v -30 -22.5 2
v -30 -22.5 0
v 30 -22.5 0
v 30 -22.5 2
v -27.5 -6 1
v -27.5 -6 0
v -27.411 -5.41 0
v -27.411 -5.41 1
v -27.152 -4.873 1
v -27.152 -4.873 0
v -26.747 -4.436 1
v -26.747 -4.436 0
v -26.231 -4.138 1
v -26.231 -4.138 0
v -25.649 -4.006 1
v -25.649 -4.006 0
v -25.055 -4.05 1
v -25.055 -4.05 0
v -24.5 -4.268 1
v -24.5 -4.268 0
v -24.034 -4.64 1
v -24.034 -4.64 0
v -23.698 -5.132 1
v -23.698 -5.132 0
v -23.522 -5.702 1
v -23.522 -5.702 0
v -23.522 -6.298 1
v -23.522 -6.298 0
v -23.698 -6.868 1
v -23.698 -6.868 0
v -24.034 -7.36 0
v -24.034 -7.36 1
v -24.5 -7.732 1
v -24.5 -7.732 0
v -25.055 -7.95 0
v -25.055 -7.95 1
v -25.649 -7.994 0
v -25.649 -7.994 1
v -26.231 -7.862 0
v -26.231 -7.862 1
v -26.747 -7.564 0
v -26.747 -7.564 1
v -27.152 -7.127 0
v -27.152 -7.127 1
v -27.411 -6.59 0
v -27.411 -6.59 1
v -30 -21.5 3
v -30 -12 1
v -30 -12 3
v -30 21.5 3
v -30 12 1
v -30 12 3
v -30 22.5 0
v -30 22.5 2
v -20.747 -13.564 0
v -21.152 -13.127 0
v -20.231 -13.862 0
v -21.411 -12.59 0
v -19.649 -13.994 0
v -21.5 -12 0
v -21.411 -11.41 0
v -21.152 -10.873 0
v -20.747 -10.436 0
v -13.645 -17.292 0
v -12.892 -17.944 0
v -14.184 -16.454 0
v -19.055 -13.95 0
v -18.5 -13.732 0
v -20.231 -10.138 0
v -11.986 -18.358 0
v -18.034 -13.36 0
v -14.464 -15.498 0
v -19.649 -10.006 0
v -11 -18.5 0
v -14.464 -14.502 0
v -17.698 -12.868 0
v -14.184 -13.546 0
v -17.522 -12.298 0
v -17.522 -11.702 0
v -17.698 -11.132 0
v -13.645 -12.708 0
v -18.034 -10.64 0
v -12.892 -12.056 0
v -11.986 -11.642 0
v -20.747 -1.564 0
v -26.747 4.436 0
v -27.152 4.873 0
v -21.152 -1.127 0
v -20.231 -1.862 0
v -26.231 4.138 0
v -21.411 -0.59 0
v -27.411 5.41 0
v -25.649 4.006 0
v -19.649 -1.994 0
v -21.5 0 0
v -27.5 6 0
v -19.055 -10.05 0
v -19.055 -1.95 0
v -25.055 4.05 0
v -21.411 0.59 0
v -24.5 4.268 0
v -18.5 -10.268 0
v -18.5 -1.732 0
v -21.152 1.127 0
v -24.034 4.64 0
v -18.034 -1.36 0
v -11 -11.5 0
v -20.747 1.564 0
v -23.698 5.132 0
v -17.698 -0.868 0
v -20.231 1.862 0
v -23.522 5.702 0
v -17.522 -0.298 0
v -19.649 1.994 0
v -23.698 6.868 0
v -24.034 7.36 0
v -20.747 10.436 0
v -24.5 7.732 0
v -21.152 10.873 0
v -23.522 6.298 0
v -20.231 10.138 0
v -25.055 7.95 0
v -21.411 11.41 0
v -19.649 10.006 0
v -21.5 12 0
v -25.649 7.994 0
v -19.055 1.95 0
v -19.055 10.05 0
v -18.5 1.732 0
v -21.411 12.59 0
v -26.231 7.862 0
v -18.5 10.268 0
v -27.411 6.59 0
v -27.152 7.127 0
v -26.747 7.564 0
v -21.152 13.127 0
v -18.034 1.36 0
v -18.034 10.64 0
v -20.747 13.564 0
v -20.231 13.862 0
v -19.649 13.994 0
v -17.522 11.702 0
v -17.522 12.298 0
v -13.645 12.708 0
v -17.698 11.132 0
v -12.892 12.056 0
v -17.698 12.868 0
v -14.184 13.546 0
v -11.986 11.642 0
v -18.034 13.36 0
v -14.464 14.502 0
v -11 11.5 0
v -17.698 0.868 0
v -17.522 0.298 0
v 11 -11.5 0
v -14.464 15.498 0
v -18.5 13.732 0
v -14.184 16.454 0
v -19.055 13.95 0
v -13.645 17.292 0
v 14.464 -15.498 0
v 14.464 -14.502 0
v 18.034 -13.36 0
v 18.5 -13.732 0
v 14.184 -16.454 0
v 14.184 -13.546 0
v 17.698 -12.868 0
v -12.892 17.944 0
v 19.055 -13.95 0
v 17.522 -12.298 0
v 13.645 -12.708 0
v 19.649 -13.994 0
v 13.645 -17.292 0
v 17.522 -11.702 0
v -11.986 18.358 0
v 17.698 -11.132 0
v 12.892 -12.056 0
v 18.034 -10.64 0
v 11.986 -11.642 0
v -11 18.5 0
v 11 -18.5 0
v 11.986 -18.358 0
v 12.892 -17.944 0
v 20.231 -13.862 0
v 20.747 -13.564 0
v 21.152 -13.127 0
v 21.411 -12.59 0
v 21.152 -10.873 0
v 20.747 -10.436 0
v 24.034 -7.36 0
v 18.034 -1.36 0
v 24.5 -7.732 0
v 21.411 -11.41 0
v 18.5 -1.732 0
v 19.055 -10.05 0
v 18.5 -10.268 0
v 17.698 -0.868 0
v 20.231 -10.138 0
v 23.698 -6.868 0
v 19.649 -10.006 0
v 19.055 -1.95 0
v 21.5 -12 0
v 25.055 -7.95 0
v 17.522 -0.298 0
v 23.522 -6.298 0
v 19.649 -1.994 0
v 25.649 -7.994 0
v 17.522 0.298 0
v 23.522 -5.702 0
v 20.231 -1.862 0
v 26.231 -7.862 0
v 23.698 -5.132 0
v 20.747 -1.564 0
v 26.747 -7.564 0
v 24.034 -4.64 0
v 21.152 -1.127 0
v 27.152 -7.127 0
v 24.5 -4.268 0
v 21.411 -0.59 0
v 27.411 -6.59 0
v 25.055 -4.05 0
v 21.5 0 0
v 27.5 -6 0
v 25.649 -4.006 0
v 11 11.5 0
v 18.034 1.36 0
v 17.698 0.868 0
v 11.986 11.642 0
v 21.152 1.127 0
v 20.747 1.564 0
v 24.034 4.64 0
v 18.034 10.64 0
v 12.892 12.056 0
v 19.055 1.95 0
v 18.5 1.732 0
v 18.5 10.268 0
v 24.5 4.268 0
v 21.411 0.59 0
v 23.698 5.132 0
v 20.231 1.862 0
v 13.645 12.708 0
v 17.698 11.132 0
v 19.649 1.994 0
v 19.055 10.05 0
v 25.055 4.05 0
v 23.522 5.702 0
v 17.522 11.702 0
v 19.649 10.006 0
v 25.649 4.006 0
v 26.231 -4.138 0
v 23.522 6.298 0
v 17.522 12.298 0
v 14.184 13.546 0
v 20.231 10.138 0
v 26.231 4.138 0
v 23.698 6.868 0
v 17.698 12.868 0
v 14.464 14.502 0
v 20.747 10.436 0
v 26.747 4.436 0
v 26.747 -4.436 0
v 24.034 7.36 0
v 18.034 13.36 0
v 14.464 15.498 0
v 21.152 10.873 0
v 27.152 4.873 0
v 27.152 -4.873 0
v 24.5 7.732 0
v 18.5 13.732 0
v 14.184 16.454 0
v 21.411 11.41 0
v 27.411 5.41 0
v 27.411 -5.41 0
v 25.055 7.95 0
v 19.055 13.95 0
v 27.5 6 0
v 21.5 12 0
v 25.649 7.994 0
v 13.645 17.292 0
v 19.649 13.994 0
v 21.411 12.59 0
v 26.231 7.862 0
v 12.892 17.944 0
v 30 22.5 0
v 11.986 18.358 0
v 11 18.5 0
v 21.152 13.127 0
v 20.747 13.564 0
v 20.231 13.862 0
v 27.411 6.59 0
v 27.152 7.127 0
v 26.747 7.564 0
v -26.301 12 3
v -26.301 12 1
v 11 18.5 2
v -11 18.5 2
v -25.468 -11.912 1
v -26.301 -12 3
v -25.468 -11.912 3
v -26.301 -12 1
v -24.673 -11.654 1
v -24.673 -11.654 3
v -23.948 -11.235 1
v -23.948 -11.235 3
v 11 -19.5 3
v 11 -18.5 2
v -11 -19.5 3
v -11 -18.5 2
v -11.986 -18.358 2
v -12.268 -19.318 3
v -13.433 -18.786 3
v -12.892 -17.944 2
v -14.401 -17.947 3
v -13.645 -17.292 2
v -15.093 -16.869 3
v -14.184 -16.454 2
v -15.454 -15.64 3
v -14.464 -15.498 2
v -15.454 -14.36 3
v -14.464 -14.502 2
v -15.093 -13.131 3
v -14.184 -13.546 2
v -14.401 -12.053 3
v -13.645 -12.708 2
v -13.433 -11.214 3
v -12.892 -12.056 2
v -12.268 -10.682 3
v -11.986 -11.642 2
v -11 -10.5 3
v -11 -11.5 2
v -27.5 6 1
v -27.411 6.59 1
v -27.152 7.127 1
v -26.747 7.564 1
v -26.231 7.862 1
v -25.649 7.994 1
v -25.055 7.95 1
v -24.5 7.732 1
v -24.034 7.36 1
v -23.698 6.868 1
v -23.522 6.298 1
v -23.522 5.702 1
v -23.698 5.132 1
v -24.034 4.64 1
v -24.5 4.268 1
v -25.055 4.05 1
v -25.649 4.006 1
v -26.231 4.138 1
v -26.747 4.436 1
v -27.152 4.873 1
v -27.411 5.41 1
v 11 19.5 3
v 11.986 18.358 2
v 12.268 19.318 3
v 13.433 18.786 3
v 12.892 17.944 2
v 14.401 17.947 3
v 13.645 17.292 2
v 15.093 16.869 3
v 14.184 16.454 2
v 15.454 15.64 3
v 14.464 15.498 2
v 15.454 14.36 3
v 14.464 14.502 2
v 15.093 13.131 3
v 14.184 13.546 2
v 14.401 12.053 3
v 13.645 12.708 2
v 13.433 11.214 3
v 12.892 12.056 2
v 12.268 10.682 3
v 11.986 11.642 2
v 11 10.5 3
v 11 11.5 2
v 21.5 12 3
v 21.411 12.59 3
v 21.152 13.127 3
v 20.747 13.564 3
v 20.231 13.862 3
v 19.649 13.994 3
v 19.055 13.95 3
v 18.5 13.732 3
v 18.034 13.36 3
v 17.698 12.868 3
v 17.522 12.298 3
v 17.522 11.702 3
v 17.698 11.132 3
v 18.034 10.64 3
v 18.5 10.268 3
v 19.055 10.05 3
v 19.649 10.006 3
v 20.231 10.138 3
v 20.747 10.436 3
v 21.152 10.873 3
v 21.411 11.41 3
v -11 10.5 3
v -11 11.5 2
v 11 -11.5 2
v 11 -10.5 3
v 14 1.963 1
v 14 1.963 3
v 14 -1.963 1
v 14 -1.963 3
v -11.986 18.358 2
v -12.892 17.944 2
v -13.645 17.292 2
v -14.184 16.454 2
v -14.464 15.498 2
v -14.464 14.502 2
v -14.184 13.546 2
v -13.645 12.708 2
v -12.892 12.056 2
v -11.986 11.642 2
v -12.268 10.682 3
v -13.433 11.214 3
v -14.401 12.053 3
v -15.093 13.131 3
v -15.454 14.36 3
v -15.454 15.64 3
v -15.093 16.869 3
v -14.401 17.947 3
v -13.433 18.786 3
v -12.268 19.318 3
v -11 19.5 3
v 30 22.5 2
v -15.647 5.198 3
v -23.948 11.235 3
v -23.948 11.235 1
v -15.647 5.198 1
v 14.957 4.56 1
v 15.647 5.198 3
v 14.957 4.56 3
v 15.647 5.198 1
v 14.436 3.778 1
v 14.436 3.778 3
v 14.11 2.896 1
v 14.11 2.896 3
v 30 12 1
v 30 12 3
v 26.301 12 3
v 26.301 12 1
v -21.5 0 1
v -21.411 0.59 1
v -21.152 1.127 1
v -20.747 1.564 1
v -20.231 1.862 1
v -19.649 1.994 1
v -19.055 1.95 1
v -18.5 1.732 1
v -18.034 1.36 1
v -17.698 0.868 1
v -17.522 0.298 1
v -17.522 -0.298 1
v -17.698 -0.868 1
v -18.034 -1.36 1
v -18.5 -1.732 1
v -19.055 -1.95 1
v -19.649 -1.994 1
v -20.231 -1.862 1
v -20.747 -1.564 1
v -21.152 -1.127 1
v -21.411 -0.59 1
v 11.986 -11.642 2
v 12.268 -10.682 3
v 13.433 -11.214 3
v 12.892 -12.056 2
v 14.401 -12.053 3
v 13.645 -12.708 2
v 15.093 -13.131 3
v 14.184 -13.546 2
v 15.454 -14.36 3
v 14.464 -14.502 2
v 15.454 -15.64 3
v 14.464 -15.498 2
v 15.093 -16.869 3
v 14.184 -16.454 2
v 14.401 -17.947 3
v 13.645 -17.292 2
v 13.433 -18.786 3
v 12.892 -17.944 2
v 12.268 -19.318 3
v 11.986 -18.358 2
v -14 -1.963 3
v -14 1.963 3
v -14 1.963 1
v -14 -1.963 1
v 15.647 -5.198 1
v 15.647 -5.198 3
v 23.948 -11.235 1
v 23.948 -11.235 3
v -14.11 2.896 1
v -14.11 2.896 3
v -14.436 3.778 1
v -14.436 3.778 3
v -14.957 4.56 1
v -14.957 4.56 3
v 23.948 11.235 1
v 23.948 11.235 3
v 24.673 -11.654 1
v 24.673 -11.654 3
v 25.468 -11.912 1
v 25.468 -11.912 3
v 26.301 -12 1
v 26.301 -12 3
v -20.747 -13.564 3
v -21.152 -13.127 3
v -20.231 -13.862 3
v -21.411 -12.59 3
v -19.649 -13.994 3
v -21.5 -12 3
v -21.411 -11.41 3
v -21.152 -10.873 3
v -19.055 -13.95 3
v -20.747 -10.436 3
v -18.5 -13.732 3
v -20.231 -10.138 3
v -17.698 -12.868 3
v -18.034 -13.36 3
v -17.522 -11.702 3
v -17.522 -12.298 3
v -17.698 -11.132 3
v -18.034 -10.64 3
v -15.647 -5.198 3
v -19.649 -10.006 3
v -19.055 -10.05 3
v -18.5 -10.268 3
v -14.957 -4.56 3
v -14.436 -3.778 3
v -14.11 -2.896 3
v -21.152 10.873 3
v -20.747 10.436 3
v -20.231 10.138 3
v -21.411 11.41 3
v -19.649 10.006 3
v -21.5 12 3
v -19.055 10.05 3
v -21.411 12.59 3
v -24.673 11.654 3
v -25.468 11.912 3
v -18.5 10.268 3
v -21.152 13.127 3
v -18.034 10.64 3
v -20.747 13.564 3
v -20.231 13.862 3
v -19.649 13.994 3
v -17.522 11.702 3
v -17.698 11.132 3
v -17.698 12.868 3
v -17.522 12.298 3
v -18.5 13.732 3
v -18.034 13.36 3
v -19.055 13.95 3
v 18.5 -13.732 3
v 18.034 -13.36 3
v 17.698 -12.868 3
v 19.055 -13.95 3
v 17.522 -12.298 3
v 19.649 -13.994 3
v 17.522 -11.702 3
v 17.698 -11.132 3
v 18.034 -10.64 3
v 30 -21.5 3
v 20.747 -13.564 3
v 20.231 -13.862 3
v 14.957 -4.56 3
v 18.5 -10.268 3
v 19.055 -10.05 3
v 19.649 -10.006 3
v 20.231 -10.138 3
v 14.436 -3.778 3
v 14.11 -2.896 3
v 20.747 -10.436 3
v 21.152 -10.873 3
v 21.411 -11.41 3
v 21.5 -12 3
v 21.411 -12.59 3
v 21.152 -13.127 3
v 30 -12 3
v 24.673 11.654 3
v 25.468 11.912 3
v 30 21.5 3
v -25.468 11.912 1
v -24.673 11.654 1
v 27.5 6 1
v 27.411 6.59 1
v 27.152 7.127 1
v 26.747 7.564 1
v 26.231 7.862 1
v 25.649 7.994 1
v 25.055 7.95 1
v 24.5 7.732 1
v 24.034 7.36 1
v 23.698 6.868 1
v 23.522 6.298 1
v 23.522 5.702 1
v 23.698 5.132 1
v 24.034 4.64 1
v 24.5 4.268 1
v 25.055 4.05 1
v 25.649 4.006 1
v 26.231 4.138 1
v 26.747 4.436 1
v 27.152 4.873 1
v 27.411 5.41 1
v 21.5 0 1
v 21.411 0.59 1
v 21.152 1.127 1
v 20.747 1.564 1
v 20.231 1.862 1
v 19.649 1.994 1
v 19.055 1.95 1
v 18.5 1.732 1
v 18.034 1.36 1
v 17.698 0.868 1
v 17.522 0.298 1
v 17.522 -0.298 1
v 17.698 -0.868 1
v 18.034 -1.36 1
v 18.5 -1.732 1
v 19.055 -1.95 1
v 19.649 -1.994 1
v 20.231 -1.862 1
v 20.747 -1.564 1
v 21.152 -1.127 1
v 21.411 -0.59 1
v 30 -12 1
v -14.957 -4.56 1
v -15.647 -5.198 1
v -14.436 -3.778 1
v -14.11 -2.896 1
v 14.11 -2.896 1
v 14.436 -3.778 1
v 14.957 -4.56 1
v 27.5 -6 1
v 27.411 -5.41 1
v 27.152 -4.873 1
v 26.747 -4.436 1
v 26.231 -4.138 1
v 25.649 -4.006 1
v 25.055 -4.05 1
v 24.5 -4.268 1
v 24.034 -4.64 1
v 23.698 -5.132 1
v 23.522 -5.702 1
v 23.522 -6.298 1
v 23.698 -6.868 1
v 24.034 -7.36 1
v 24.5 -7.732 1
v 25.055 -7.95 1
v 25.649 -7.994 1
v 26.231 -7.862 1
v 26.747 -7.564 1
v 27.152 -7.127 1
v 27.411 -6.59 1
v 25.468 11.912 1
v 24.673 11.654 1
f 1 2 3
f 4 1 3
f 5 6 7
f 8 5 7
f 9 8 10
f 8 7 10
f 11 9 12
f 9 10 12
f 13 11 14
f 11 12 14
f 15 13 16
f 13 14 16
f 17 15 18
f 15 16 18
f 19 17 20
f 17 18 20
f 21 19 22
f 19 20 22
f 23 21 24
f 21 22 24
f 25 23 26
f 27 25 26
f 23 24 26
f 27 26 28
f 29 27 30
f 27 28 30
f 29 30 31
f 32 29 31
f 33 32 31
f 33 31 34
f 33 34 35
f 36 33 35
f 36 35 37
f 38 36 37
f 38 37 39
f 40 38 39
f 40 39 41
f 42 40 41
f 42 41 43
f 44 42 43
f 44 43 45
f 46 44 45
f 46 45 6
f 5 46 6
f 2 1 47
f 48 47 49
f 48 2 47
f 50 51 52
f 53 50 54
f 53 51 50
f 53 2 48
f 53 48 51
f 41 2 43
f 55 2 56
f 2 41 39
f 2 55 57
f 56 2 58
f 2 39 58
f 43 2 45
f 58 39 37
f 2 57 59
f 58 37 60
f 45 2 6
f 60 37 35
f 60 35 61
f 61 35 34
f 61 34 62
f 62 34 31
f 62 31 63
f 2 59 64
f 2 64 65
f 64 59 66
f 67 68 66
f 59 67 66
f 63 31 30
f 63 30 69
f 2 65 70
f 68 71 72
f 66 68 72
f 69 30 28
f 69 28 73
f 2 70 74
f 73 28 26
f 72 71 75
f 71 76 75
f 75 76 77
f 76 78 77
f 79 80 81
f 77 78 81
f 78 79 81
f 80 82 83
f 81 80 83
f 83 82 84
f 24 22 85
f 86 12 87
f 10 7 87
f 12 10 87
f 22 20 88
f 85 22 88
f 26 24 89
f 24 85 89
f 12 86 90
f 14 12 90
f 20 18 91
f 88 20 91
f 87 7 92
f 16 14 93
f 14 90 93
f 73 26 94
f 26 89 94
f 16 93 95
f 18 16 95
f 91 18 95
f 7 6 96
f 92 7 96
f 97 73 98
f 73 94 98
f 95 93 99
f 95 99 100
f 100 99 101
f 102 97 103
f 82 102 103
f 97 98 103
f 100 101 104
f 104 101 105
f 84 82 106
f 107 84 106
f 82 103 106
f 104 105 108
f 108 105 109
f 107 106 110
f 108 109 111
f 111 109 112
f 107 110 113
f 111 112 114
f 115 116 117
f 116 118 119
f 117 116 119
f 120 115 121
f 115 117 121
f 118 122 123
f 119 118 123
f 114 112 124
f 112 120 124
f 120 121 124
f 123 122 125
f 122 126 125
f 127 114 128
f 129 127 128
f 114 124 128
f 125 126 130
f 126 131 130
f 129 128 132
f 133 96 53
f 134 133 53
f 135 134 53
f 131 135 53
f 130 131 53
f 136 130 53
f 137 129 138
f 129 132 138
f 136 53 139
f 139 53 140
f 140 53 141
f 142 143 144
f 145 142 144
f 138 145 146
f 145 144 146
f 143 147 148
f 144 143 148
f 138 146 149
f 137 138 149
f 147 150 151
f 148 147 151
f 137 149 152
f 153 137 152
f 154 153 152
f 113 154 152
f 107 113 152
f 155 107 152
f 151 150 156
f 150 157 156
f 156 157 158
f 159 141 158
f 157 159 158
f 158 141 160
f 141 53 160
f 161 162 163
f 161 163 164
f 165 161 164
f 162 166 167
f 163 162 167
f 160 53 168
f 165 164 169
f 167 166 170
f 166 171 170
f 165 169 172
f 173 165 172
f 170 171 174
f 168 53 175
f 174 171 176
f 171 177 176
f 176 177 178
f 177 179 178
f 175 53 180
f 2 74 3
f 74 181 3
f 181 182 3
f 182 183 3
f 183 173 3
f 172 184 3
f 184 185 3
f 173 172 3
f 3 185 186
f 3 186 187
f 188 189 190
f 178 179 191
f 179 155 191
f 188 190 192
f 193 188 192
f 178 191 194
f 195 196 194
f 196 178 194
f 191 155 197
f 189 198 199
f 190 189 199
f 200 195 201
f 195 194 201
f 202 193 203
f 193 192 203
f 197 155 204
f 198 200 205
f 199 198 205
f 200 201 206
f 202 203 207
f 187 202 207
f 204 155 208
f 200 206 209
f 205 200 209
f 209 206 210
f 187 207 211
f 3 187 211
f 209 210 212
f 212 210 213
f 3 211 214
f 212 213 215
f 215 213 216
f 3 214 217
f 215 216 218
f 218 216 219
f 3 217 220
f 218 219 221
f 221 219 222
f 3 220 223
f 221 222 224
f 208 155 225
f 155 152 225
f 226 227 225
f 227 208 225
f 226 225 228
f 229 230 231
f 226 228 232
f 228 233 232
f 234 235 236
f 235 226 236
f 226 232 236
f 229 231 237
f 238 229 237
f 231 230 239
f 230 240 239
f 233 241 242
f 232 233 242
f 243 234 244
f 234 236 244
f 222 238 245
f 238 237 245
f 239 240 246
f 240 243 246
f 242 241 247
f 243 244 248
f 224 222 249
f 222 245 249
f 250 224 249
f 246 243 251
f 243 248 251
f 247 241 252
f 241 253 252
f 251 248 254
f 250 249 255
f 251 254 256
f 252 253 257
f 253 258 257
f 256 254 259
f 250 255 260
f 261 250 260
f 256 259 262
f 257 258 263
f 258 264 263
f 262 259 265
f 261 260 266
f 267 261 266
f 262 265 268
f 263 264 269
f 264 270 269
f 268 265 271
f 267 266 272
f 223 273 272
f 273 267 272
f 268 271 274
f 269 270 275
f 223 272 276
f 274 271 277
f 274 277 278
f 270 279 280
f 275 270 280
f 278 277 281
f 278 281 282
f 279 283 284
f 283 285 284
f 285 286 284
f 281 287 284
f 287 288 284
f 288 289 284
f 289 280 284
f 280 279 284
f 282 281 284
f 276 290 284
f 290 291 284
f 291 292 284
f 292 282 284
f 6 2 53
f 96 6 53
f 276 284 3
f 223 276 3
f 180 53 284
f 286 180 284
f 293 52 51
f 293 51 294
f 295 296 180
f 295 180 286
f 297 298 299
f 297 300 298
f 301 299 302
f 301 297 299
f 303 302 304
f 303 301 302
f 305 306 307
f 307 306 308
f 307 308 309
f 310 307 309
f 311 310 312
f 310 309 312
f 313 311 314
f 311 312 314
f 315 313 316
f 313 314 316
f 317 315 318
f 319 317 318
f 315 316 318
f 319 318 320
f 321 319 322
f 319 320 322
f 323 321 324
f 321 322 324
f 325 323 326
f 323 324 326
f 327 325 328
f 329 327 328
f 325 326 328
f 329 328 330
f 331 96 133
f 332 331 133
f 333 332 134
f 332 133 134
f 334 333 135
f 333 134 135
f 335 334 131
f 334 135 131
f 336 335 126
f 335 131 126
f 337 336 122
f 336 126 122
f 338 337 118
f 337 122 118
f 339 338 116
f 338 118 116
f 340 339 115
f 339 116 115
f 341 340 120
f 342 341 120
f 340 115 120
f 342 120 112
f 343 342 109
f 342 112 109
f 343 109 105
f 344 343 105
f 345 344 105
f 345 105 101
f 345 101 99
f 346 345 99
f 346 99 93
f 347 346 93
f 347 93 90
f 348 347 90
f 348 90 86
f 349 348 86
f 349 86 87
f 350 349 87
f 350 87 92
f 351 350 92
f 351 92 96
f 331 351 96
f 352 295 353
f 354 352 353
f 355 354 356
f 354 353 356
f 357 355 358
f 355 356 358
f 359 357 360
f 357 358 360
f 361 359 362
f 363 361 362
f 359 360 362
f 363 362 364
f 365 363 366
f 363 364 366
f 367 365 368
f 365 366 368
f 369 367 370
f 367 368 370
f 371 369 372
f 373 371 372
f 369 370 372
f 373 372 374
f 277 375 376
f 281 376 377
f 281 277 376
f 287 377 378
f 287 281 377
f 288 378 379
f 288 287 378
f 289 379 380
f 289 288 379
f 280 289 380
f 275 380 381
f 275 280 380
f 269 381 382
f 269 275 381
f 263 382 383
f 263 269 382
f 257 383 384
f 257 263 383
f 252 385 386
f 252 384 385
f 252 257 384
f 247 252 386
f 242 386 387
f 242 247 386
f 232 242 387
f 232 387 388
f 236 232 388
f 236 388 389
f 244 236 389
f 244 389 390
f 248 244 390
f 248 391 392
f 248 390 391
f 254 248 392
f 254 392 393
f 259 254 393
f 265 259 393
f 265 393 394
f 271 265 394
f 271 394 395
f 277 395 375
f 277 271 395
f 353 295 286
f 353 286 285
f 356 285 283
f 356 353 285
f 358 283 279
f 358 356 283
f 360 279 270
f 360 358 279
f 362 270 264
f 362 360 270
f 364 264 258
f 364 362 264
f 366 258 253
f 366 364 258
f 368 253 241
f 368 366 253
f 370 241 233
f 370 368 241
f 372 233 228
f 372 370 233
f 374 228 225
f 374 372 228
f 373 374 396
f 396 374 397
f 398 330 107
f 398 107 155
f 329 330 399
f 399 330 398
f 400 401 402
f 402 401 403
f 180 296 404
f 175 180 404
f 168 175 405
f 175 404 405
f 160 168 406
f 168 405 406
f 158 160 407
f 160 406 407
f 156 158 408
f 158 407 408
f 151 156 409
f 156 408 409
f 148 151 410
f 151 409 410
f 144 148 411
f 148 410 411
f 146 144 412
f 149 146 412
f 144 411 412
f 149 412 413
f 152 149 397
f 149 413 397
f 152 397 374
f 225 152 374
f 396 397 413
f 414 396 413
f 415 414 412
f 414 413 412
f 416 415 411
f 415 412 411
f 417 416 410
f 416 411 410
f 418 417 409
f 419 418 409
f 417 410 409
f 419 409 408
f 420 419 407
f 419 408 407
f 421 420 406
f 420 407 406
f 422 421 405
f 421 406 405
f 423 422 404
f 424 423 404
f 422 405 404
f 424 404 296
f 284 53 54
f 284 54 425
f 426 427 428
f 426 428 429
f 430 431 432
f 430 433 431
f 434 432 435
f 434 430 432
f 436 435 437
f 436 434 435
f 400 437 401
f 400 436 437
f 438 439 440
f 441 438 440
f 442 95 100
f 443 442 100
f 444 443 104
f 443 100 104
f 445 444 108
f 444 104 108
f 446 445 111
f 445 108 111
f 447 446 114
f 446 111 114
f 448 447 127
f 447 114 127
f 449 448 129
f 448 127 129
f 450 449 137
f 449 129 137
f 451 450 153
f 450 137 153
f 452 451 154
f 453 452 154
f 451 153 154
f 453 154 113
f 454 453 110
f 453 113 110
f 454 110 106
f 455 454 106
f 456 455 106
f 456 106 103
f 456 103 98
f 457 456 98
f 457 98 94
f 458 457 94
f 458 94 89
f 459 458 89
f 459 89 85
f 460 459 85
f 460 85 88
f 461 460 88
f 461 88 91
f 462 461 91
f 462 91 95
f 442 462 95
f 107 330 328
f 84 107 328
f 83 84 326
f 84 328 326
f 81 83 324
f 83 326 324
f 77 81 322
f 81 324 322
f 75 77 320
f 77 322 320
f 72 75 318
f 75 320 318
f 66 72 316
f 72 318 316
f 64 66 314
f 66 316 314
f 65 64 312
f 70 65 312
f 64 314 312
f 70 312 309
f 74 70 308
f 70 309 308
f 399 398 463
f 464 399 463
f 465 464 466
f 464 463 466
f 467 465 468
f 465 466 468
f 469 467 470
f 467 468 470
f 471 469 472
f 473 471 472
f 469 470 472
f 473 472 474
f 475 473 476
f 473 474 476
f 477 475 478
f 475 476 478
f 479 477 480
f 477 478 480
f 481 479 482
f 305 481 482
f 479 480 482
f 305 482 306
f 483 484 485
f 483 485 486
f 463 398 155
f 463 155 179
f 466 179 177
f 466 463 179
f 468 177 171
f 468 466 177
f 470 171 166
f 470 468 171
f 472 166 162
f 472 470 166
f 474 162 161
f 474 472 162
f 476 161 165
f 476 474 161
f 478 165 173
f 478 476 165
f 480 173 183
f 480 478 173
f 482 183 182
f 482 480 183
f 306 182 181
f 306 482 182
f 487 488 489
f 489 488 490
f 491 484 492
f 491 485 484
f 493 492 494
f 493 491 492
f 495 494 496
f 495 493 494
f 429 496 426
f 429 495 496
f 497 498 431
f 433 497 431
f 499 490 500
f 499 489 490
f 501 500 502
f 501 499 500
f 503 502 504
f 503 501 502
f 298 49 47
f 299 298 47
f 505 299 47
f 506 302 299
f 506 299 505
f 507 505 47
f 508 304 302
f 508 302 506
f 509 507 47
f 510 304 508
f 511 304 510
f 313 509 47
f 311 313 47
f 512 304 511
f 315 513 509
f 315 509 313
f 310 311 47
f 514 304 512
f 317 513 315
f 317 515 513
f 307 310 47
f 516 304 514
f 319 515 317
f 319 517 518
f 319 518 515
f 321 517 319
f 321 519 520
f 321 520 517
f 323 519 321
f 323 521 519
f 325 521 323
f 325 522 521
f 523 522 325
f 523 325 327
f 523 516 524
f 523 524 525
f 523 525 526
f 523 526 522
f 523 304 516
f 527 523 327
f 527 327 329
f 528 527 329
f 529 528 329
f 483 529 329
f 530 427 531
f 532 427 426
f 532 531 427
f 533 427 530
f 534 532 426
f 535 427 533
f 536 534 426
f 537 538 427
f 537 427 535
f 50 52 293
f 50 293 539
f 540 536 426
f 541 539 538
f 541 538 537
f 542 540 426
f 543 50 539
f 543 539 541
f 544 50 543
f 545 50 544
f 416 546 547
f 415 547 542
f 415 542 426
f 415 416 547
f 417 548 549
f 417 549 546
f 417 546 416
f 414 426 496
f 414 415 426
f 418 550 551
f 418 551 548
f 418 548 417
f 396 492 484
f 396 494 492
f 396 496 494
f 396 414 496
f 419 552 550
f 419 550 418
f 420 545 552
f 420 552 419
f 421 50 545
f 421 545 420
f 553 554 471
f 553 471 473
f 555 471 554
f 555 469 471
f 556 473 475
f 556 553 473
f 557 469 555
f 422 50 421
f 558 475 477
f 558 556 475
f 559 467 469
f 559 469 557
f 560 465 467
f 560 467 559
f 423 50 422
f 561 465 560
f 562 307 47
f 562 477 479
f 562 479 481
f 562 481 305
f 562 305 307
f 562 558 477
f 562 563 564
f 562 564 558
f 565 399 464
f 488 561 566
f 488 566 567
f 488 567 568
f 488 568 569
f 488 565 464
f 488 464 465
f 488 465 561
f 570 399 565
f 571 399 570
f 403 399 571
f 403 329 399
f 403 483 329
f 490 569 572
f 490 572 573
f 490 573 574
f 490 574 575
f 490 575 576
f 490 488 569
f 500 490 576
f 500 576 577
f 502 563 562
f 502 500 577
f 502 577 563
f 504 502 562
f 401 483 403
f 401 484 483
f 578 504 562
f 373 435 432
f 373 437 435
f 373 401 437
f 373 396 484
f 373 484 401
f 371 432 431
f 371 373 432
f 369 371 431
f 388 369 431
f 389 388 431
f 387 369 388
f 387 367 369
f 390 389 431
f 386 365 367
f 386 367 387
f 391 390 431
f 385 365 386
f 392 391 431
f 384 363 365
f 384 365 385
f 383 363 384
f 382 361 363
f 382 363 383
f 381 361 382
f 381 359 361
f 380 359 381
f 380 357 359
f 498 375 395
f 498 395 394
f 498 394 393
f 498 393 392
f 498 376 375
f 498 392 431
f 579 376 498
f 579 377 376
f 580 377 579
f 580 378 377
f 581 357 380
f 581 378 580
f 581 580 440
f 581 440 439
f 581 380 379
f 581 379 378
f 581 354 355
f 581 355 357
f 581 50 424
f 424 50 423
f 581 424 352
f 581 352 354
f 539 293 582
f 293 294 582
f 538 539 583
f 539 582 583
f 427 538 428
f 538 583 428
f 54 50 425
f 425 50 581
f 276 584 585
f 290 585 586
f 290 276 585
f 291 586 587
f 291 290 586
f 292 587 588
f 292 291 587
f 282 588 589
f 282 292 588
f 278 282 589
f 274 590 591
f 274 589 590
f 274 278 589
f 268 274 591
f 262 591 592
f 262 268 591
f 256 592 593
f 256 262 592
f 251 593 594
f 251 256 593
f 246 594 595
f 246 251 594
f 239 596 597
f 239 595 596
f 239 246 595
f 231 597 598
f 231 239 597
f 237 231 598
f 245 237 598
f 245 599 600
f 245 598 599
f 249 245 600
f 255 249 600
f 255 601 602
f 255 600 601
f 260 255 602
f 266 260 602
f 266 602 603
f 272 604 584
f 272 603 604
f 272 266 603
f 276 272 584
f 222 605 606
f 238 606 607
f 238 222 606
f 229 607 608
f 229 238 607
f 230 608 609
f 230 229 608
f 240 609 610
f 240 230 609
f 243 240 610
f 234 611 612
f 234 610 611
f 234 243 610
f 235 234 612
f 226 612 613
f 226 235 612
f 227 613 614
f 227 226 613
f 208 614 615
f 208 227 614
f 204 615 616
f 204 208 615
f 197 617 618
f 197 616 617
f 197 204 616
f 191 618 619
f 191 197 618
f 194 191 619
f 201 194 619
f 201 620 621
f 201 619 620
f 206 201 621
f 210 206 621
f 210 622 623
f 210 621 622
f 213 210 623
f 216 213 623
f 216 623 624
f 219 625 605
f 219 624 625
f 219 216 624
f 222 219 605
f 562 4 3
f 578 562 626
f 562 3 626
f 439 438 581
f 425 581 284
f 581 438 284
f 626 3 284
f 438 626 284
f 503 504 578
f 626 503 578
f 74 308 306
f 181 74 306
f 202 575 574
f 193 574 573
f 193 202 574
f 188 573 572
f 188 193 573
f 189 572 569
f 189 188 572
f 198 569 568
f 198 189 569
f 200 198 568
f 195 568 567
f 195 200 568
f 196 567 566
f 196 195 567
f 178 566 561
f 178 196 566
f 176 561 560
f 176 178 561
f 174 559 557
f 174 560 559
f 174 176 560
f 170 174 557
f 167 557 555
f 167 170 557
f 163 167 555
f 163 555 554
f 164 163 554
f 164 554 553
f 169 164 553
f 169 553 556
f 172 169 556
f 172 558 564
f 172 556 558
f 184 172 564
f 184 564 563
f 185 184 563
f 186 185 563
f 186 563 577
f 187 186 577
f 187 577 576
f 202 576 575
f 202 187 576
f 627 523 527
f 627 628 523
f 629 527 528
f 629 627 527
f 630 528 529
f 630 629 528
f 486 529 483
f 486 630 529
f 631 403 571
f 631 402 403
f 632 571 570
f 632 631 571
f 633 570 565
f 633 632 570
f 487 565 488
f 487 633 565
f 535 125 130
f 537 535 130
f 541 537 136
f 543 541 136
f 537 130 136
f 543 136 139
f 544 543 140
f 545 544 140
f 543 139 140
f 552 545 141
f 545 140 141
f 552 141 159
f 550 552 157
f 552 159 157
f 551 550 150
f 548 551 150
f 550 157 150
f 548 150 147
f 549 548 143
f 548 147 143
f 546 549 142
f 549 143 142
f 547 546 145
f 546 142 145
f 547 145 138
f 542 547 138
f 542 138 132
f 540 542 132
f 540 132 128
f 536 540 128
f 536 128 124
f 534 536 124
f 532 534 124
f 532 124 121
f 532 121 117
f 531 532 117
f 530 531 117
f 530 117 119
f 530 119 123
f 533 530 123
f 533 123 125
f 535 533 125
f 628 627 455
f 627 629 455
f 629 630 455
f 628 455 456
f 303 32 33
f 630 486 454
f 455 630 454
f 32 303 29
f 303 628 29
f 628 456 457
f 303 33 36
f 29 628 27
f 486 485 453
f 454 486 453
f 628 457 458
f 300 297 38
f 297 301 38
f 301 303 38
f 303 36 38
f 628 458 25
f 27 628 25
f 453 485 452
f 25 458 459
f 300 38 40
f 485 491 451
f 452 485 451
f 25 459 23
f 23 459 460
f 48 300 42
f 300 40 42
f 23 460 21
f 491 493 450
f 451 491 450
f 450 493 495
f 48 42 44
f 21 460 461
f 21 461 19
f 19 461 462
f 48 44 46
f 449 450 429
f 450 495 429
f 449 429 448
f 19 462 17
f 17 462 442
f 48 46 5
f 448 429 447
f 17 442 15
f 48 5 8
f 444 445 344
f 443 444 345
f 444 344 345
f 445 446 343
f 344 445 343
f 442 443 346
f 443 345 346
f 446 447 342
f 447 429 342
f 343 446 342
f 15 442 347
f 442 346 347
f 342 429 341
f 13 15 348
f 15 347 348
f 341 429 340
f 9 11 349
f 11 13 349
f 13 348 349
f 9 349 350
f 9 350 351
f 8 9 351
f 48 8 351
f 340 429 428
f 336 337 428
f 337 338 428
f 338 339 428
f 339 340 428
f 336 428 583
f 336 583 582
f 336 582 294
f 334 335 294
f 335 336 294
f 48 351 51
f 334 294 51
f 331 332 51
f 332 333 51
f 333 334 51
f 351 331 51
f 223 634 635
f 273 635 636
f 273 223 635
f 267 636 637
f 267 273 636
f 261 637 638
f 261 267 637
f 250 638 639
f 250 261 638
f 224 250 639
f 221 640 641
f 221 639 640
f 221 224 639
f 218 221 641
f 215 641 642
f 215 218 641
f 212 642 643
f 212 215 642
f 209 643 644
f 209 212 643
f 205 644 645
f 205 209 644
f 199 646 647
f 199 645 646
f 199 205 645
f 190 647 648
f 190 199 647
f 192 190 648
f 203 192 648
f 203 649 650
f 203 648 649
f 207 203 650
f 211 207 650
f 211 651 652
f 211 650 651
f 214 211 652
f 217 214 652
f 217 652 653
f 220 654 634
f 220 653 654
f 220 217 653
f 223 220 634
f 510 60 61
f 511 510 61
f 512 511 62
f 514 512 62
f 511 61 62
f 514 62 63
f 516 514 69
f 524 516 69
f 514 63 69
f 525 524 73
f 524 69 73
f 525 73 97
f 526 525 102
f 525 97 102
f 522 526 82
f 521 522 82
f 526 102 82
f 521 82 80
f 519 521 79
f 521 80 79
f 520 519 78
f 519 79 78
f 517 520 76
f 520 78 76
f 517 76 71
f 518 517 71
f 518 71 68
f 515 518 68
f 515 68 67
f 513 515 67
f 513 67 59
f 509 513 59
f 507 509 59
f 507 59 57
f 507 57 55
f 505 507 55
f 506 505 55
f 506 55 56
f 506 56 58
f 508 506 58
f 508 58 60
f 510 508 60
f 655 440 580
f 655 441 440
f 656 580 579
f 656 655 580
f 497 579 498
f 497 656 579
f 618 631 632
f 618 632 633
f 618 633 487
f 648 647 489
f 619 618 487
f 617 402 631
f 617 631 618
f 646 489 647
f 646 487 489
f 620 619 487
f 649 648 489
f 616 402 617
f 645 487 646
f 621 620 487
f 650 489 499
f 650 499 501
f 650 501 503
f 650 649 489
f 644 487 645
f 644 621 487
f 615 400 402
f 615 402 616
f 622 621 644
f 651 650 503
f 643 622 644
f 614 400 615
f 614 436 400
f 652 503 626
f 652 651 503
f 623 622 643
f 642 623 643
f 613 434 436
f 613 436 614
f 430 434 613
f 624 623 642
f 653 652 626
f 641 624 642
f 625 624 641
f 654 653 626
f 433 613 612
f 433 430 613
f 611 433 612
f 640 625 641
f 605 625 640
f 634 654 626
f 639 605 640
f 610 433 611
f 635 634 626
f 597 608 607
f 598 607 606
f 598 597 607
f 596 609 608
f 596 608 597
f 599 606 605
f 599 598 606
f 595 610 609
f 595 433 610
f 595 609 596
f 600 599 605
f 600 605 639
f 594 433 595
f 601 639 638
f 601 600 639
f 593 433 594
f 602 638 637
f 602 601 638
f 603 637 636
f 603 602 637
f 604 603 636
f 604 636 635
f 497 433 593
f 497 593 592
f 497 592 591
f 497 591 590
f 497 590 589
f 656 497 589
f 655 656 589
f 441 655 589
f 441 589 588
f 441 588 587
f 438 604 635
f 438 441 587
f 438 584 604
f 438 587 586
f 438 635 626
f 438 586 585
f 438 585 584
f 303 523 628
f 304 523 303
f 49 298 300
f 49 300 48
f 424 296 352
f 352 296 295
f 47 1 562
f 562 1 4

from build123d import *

# Parameters (mm, degrees)
SKETCH1_W            = 60
SKETCH1_H            = 45
BOSS_EXTRUDE1_DEPTH  = 3
SKETCH2_R            = 2
CUT_EXTRUDE1_DEPTH   = 5
CUT_EXTRUDE5_DEPTH   = 2
CUT_EXTRUDE4_DEPTH   = 5
CHAMFER2_SIZE        = 1
FILLET1_R            = 4
FILLET1_OF_MIRROR4_R = 4
CHAMFER1_SIZE        = 1


with BuildPart() as part:
    # Sketch1 → Boss-Extrude1 (new body)
    with BuildSketch(Plane.XY):
        Rectangle(SKETCH1_W, SKETCH1_H)
    extrude(amount=BOSS_EXTRUDE1_DEPTH)

    # Sketch2 → Cut-Extrude1 (cut)
    with BuildSketch(Plane(origin=(0, 0, 0), x_dir=(-1, 0, 0), z_dir=(0, 0, -1))):
        with Locations((19.5, 0)):
            Circle(SKETCH2_R)
        with Locations((25.5, 6)):
            Circle(SKETCH2_R)
        with Locations((25.5, -6)):
            Circle(SKETCH2_R)
        with Locations((19.5, -12)):
            Circle(SKETCH2_R)
        with Locations((19.5, 12)):
            Circle(SKETCH2_R)
    cut_extrude1 = extrude(amount=-CUT_EXTRUDE1_DEPTH, mode=Mode.SUBTRACT)

    # Sketch8 → Cut-Extrude5 (cut)
    with BuildSketch(Plane.XY.offset(3)):
        Polygon((-14, 4), (-14, -4), (-25, -12), (-30, -12), (-30, 12), (-25, 12), align=None)
    cut_extrude5 = extrude(amount=-CUT_EXTRUDE5_DEPTH, mode=Mode.SUBTRACT)

    # Sketch7 → Cut-Extrude4 (cut)
    with BuildSketch(Plane.XY.offset(3)):
        with BuildLine():
            Line((-11, -18.5), (9, -18.5))
            Line((9, -18.5), (9, -11.5))
            Line((9, -11.5), (-11, -11.5))
            ThreePointArc((-11, -11.5), (-14.5, -15), (-11, -18.5))
        make_face()
        with BuildLine():
            Line((-11, 11.5), (9, 11.5))
            Line((9, 11.5), (9, 18.5))
            Line((9, 18.5), (-11, 18.5))
            ThreePointArc((-11, 18.5), (-14.5, 15), (-11, 11.5))
        make_face()
    cut_extrude4 = extrude(amount=-CUT_EXTRUDE4_DEPTH, mode=Mode.SUBTRACT)

    # Chamfer2
    chamfer2_edges = [part.edges().sort_by_distance(p)[0] for p in [
        (0, -22.5, 3),
        (0, 22.5, 3),
    ]]
    chamfer(chamfer2_edges, length=CHAMFER2_SIZE)

    # Fillet1
    fillet1_edges = [part.edges().sort_by_distance(p)[0] for p in [
        (-25, 12, 2),
        (-14, 4, 2),
        (-14, -4, 2),
        (-25, -12, 2),
    ]]
    fillet(fillet1_edges, radius=FILLET1_R)

    # Mirror4: Cut-Extrude1, Cut-Extrude5, Cut-Extrude4 across plane
    add(cut_extrude1.mirror(Plane(origin=(0, 0, 0), x_dir=(0, 0, 1), z_dir=(1, 0, 0))), mode=Mode.SUBTRACT)
    add(cut_extrude5.mirror(Plane(origin=(0, 0, 0), x_dir=(0, 0, 1), z_dir=(1, 0, 0))), mode=Mode.SUBTRACT)
    add(cut_extrude4.mirror(Plane(origin=(0, 0, 0), x_dir=(0, 0, 1), z_dir=(1, 0, 0))), mode=Mode.SUBTRACT)

    # Fillet1 of Mirror4
    fillet1_of_mirror4_edges = [part.edges().sort_by_distance(p)[0] for p in [
        (25, 12, 2),
        (14, 4, 2),
        (14, -4, 2),
        (25, -12, 2),
    ]]
    fillet(fillet1_of_mirror4_edges, radius=FILLET1_OF_MIRROR4_R)

    # Chamfer1
    chamfer1_edges = [part.edges().sort_by_distance(p)[0] for p in [
        (14.5, -15, 3),
        (14.5, 15, 3),
        (-14.5, -15, 3),
        (0, -18.5, 3),
        (0, -11.5, 3),
        (0, 18.5, 3),
        (-14.5, 15, 3),
        (0, 11.5, 3),
    ]]
    chamfer(chamfer1_edges, length=CHAMFER1_SIZE)


solid = part.part
